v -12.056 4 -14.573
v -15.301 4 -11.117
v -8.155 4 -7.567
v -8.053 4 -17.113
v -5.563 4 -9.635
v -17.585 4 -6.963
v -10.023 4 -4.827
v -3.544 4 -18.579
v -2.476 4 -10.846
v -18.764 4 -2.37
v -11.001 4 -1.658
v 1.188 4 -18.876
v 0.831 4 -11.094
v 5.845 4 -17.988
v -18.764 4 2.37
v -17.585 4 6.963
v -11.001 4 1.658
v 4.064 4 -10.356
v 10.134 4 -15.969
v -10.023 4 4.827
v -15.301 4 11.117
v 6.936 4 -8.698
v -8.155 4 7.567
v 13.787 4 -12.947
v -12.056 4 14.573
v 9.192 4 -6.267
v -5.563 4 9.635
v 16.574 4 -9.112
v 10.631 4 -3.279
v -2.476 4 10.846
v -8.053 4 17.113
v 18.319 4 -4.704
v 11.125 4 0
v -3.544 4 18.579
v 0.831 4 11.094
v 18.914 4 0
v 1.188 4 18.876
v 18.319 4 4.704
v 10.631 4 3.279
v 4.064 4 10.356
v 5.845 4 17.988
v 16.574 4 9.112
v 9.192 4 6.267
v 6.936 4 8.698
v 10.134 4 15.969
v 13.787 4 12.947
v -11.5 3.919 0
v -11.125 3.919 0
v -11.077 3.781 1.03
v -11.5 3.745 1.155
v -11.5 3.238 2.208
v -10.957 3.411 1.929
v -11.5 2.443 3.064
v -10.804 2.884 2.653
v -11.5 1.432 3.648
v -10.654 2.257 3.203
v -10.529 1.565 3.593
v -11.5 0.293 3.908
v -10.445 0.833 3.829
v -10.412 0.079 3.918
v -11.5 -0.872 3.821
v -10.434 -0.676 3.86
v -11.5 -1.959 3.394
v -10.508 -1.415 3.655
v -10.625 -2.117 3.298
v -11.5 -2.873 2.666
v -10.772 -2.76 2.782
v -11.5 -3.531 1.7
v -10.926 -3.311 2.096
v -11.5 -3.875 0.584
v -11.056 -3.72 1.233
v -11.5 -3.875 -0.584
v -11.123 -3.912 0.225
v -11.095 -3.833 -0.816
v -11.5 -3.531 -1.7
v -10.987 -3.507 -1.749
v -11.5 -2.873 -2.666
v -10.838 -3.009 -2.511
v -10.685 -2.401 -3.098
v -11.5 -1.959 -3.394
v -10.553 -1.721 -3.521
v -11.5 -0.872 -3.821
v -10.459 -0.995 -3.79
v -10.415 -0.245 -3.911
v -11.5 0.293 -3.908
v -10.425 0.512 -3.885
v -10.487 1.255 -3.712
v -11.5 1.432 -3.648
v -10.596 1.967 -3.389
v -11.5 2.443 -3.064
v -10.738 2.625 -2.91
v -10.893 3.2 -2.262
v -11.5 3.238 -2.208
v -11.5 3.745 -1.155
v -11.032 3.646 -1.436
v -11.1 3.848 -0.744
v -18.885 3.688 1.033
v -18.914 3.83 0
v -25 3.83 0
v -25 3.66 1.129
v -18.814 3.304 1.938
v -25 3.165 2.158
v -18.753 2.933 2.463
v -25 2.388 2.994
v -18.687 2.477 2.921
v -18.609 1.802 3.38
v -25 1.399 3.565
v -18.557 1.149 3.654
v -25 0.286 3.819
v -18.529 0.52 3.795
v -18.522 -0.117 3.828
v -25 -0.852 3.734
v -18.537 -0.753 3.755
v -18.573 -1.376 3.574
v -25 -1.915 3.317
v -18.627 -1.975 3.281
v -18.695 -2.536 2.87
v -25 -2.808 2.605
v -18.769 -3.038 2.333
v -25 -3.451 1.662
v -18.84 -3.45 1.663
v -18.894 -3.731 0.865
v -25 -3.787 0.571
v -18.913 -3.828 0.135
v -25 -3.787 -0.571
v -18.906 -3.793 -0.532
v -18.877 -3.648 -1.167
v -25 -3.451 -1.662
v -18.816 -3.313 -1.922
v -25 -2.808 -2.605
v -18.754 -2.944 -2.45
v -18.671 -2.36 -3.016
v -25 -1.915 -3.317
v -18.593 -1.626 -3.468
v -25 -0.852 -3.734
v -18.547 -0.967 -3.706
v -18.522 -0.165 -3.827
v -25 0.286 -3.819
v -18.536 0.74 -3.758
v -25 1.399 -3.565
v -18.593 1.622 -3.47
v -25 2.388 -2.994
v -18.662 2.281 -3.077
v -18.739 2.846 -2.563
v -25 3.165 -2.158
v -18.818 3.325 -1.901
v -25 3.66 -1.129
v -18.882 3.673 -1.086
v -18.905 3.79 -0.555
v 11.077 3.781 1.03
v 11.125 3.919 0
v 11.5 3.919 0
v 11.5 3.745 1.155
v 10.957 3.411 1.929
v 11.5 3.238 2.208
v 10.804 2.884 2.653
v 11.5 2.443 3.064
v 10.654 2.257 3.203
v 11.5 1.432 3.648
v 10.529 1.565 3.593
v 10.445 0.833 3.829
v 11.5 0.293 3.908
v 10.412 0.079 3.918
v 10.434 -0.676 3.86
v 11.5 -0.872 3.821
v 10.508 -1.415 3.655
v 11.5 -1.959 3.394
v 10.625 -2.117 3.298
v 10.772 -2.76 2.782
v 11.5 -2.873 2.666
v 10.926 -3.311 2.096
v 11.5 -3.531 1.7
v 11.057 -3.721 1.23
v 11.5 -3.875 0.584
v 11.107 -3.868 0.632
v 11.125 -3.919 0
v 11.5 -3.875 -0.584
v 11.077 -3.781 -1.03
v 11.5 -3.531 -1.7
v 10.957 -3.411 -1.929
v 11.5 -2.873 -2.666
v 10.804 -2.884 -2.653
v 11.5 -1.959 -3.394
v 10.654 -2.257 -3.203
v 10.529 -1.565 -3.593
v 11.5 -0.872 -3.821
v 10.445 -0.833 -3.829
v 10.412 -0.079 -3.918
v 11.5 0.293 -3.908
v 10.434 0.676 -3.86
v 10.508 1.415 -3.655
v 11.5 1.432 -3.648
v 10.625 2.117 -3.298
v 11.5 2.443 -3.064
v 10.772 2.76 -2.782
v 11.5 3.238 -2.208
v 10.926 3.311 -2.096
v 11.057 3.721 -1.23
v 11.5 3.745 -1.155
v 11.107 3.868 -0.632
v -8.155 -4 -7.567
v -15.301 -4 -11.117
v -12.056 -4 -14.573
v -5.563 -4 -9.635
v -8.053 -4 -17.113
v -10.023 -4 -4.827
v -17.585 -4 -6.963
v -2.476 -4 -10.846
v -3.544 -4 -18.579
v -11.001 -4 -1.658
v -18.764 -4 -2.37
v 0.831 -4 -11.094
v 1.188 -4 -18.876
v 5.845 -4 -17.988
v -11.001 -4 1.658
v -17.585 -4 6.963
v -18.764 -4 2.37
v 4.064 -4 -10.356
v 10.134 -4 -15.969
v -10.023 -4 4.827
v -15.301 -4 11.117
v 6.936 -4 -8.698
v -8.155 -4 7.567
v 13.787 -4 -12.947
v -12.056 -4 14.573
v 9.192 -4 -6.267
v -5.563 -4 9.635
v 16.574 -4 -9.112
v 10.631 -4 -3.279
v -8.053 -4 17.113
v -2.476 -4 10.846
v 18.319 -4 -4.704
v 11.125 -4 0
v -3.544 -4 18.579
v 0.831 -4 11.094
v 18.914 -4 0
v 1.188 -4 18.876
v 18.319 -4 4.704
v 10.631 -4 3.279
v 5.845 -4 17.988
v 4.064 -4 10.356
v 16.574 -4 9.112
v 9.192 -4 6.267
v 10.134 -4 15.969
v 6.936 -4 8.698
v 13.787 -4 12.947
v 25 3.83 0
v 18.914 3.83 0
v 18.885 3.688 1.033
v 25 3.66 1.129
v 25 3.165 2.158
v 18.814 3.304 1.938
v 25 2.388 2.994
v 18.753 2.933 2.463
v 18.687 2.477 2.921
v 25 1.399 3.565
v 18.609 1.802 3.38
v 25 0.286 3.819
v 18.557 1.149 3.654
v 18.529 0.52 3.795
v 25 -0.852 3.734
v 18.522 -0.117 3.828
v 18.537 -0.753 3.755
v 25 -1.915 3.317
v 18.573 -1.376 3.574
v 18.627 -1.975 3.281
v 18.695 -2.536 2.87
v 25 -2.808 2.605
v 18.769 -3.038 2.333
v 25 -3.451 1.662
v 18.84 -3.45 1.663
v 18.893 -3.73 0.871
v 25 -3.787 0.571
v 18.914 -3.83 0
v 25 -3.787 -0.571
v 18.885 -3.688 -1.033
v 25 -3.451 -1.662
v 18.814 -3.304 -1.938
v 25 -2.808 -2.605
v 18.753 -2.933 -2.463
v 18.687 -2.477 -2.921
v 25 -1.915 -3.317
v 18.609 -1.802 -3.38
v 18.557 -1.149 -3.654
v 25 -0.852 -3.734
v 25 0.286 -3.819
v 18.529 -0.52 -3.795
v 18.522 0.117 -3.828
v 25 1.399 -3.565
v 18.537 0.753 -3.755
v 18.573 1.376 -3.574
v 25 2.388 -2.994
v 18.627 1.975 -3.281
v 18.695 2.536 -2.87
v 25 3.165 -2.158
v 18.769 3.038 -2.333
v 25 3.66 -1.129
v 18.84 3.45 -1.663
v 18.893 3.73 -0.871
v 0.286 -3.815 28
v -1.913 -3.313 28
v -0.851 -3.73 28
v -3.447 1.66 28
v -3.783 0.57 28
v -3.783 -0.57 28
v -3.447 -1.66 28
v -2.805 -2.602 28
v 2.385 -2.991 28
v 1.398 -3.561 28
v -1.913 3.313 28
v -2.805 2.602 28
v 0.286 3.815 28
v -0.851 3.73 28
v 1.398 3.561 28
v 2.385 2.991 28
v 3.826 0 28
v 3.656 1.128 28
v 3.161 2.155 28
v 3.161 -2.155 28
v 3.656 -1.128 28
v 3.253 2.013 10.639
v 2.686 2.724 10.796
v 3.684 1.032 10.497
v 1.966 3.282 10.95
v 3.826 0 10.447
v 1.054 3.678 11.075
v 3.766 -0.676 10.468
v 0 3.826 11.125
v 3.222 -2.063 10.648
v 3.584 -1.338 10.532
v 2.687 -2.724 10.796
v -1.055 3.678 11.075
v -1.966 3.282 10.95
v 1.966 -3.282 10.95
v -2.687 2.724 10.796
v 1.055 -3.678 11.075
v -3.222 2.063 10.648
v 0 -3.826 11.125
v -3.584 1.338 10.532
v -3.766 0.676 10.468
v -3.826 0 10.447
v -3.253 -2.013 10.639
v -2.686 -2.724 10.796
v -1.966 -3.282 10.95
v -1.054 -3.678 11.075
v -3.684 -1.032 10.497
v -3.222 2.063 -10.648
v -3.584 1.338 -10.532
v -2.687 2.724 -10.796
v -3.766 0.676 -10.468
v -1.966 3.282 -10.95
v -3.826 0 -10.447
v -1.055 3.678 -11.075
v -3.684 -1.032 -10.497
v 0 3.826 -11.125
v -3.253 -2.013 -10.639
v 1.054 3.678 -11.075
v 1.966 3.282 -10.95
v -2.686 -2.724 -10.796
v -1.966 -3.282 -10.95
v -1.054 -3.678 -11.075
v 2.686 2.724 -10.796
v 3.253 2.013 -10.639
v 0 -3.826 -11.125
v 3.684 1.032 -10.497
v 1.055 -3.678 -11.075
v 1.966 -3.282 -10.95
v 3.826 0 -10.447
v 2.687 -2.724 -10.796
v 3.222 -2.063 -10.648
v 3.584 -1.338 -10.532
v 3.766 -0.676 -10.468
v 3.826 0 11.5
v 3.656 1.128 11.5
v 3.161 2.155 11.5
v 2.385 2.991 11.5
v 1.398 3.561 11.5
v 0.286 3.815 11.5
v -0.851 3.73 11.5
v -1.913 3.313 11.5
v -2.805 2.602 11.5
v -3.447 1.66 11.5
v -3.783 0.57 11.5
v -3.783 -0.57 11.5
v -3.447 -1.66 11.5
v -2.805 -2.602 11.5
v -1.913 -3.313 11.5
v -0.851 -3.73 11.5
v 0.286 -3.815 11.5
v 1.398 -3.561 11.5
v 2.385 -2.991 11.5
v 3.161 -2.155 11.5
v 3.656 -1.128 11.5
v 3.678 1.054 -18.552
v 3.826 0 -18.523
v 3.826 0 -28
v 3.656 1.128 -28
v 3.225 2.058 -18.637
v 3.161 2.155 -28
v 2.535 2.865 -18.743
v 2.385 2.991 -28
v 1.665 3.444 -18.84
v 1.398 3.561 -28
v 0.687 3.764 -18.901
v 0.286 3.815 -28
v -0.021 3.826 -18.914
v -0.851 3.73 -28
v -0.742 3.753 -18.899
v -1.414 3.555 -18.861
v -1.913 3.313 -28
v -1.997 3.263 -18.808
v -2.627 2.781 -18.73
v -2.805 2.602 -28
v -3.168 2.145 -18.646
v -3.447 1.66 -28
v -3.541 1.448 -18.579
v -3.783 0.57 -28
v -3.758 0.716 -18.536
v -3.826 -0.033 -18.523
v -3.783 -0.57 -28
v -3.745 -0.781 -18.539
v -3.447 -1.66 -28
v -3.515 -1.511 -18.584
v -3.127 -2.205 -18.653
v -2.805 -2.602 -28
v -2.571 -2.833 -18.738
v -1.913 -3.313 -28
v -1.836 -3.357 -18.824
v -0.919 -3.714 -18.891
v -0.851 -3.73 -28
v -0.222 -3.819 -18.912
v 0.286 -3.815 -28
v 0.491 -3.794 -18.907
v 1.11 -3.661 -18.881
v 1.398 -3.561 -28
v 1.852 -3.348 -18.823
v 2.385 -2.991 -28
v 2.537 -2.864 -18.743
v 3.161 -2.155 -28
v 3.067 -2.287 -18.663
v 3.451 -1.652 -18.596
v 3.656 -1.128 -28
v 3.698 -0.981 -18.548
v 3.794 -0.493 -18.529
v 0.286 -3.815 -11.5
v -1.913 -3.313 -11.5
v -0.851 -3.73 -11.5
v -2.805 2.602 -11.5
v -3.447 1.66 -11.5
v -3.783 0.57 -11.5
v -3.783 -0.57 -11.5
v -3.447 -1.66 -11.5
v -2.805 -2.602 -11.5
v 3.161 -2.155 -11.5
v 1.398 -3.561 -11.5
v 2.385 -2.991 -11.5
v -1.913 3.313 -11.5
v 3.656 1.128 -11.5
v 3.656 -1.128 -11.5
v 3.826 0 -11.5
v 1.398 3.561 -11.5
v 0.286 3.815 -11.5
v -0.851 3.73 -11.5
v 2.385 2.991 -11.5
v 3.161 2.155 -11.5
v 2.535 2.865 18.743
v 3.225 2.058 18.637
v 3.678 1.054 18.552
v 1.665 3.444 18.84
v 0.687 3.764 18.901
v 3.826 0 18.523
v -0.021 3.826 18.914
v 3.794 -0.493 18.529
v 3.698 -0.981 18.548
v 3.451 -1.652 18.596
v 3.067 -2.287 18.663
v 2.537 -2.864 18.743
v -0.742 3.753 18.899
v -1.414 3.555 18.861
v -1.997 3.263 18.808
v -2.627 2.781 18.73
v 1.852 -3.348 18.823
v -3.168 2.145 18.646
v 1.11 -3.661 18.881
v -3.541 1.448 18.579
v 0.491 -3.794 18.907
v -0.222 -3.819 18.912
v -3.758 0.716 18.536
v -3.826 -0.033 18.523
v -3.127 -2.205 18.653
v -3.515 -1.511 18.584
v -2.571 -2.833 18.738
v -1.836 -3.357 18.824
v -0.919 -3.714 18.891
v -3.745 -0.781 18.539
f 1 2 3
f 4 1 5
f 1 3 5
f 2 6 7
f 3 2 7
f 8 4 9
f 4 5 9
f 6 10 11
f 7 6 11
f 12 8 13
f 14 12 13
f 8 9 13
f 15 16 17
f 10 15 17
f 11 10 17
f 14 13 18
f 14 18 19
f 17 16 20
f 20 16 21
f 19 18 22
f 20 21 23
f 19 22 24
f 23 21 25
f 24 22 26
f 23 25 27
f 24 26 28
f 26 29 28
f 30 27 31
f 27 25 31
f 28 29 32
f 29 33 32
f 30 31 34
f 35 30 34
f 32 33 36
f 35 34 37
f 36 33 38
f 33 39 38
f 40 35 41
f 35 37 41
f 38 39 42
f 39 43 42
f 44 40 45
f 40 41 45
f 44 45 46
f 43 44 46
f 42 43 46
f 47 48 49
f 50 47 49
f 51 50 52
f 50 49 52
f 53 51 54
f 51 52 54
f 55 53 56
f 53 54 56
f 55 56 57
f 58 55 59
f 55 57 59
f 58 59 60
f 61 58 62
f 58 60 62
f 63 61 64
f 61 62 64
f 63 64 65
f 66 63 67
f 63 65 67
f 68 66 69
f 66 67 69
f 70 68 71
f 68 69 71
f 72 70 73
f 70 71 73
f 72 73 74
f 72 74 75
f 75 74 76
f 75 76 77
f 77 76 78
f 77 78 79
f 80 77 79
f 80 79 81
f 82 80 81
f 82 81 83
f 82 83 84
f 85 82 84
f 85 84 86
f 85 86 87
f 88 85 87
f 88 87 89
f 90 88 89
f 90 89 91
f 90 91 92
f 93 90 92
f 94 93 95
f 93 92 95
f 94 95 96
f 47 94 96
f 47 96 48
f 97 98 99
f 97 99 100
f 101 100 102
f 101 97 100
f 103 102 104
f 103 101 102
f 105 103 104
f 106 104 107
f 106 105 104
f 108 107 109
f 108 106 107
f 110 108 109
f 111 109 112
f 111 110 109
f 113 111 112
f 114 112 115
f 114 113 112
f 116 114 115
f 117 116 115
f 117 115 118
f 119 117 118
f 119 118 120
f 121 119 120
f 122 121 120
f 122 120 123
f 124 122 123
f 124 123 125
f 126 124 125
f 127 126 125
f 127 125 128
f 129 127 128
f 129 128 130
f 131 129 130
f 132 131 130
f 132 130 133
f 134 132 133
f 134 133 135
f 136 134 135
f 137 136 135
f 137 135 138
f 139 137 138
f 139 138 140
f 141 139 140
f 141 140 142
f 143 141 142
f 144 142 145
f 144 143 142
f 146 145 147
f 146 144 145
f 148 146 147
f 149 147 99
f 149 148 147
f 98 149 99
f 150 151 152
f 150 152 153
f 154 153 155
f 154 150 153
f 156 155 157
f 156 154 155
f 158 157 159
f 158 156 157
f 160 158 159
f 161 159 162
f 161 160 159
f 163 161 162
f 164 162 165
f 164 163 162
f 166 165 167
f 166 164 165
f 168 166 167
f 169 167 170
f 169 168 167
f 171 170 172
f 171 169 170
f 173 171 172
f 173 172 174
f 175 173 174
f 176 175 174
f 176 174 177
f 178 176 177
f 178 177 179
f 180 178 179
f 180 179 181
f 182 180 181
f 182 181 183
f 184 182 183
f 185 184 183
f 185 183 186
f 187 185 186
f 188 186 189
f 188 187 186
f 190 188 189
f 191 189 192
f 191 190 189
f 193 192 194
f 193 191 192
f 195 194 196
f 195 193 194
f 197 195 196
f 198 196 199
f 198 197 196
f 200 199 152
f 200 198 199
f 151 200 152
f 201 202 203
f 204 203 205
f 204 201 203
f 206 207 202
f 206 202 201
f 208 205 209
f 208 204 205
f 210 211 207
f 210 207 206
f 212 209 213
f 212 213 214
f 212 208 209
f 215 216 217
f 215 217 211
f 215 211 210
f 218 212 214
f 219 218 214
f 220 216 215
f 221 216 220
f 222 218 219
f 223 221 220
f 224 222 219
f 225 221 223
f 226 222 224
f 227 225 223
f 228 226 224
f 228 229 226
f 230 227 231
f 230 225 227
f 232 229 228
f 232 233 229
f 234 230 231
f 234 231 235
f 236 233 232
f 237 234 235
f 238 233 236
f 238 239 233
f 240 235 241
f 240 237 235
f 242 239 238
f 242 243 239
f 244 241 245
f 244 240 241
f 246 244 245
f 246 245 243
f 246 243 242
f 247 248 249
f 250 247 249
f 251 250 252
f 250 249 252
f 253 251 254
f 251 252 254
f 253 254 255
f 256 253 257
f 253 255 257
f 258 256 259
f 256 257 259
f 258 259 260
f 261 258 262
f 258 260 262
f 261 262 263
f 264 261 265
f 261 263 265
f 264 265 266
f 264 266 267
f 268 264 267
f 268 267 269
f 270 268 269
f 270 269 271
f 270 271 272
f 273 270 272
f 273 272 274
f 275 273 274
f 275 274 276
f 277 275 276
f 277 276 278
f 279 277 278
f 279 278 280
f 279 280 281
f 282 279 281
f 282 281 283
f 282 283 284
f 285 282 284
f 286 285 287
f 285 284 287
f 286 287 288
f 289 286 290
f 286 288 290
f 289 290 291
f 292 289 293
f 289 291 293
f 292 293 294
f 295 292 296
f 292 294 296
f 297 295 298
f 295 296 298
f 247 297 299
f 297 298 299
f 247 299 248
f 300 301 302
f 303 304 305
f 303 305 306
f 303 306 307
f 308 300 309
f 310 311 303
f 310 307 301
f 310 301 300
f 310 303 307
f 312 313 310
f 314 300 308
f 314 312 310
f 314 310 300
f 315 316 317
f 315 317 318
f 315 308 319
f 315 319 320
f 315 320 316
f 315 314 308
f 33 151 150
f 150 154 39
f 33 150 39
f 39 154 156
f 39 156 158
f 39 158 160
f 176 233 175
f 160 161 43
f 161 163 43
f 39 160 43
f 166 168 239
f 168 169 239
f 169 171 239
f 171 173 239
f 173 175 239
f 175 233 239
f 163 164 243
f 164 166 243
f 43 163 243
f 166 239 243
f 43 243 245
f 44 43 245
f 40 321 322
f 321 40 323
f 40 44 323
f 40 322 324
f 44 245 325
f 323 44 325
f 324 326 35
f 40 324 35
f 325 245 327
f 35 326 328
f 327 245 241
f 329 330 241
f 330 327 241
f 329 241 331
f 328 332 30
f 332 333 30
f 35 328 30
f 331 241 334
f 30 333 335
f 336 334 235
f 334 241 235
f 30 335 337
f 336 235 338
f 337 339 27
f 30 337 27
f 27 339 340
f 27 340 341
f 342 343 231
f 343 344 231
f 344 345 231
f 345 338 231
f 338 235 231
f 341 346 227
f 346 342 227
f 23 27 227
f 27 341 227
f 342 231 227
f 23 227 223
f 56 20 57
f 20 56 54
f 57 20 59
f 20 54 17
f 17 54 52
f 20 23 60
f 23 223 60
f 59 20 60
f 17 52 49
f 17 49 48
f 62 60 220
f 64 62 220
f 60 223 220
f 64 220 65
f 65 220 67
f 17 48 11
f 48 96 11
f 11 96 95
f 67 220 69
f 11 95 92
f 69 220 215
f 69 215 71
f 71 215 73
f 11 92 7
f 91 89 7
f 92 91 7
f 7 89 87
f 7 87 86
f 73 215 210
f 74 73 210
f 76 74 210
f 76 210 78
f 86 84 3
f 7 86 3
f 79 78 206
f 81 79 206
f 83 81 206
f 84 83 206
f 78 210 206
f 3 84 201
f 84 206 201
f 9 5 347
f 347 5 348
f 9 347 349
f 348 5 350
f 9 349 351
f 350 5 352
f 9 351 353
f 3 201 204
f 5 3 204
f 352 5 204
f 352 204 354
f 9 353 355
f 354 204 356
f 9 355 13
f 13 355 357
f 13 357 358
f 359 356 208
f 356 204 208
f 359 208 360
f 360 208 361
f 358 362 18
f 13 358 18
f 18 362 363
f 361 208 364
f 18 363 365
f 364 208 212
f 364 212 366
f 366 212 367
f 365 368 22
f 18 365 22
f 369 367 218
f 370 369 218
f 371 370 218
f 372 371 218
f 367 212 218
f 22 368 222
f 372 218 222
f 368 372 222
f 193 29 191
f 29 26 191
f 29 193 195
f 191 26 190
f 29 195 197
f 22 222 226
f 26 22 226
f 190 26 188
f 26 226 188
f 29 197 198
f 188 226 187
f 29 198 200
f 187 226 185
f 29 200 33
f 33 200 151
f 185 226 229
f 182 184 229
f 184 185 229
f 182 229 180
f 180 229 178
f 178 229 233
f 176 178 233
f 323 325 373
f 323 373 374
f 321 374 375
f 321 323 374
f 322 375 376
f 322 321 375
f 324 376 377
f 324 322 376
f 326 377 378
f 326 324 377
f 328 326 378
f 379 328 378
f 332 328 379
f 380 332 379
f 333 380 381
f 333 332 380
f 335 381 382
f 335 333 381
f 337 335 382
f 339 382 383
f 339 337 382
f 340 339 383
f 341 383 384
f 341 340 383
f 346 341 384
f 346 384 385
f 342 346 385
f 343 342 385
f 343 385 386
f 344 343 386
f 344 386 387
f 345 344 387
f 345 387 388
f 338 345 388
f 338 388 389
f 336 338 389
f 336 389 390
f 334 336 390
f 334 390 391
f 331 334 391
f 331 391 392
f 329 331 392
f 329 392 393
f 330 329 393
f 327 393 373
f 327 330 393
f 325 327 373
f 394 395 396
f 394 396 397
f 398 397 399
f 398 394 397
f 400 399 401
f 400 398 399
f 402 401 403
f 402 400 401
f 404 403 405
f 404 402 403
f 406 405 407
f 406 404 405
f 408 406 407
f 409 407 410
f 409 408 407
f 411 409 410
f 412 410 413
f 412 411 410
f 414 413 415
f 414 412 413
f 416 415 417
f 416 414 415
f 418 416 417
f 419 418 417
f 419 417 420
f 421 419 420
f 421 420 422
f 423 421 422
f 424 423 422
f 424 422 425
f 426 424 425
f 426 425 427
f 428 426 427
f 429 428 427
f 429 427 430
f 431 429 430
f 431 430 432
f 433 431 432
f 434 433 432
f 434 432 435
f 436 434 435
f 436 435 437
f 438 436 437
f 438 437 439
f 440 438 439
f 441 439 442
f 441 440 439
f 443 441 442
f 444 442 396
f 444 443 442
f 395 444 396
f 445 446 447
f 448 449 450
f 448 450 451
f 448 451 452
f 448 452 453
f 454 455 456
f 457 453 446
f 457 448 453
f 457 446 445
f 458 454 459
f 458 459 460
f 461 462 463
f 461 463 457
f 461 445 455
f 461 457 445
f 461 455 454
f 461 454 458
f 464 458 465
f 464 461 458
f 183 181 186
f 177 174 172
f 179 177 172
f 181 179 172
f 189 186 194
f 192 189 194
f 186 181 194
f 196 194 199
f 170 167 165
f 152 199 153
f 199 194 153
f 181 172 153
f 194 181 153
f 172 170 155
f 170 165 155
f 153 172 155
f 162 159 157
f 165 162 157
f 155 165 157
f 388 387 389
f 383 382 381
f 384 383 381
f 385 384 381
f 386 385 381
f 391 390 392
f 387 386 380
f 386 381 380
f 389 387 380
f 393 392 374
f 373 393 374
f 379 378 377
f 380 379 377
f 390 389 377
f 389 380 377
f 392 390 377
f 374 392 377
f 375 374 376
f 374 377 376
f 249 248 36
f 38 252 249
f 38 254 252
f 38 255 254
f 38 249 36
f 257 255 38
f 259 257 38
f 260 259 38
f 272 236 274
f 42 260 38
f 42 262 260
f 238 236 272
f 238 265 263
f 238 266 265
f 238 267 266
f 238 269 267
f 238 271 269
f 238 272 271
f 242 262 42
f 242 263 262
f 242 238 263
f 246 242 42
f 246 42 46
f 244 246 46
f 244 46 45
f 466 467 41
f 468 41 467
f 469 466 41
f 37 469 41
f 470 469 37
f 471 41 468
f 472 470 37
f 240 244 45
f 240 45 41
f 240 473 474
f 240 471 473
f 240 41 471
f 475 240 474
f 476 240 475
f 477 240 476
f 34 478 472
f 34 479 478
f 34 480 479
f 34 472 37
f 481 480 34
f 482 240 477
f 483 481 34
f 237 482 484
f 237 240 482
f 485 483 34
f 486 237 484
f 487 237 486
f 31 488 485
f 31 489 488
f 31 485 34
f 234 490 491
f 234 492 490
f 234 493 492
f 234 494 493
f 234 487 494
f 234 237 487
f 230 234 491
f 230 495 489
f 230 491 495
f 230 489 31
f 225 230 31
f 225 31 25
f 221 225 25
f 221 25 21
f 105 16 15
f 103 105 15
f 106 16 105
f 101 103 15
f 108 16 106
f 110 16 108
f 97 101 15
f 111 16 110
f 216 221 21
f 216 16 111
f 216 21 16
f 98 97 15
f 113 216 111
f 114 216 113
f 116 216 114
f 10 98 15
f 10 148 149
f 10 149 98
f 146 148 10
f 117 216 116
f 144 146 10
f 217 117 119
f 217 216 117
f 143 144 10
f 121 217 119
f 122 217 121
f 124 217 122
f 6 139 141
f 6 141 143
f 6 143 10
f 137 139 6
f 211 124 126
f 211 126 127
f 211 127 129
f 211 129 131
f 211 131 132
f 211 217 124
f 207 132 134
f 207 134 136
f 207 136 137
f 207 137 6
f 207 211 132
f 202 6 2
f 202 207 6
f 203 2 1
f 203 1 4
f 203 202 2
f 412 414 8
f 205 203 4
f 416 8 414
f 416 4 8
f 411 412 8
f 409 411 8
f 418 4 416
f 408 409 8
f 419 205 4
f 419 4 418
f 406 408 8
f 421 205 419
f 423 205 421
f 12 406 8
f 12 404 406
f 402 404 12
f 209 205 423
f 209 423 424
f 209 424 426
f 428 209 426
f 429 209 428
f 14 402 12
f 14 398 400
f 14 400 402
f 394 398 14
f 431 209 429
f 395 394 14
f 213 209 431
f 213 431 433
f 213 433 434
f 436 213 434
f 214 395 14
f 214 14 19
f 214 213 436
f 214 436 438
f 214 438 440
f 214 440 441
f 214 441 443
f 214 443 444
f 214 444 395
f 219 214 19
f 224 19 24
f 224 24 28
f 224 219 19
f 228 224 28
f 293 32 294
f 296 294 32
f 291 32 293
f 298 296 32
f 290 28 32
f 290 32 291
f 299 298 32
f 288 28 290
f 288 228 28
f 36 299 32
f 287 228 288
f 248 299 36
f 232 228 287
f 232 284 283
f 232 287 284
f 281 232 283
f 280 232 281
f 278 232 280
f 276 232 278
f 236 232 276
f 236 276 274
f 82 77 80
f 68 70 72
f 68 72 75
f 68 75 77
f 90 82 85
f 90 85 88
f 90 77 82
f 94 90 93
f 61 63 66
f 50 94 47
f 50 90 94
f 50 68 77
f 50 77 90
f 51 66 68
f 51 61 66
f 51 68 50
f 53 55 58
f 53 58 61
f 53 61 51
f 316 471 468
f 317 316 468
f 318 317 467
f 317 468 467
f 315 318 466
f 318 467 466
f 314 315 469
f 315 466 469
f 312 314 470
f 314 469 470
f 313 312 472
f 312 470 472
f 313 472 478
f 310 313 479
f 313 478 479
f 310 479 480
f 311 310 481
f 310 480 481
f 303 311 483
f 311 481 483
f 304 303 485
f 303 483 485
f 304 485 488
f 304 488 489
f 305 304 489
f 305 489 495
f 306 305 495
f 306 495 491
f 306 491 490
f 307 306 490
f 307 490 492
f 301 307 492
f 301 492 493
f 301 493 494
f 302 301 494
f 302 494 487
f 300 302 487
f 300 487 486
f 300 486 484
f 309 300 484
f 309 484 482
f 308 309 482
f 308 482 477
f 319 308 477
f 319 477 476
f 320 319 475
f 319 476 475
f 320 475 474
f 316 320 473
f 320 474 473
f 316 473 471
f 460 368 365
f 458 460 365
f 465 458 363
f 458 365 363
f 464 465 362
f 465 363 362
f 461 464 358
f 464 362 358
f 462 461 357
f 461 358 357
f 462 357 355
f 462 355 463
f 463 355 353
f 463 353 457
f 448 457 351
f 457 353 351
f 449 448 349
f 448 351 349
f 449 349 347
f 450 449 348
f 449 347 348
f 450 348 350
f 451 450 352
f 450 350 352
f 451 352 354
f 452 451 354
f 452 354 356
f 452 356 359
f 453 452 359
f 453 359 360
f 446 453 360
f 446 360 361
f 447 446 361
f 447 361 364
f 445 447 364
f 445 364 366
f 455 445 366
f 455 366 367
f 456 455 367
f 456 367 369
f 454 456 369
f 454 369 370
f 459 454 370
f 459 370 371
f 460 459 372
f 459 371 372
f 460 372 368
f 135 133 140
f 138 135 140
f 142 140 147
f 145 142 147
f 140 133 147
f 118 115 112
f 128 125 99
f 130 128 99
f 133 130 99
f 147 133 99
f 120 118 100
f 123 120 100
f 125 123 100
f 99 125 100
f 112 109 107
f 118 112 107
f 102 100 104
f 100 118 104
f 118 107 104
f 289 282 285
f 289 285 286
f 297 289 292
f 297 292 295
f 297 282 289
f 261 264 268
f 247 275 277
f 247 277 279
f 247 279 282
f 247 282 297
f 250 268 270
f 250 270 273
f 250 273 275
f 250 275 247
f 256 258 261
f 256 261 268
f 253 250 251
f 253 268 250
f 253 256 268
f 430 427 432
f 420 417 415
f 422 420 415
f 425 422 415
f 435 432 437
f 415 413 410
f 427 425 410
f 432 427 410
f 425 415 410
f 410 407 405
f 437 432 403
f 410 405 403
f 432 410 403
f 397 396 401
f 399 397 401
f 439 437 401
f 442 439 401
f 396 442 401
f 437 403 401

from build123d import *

# Parameters (mm, degrees)
F0_R          = 18.9135358378
F0_R_2        = 11.1250506431
F1_DEPTH      = 4
F1_DEPTH_BACK = 4
F2_R          = 3.8258628395
F3_DEPTH      = 28
F3_DEPTH_BACK = 28
F4_R          = 3.8258764398
F5_DEPTH      = 11.5
F5_DEPTH_BACK = 11.5
F6_R          = 3.830099353
F7_DEPTH      = 25
F7_DEPTH_BACK = 25
F8_R          = 3.9189417201
F9_DEPTH      = 11.5
F9_DEPTH_BACK = 11.5


with BuildPart() as f1:
    # F0 (on Front) → F1 (new body, two sides)
    with BuildSketch(Plane.XZ) as f1_sk:
        Circle(F0_R)
        Circle(F0_R_2, mode=Mode.SUBTRACT)
    extrude(amount=F1_DEPTH)
    extrude(f1_sk.sketch, amount=-F1_DEPTH_BACK)

    # F2 (on Top) → F3 (join, two sides)
    with BuildSketch(Plane.XY) as f3_sk:
        Circle(F2_R)
    extrude(amount=F3_DEPTH)
    extrude(f3_sk.sketch, amount=-F3_DEPTH_BACK)

    # F4 (on Top) → F5 (cut, two sides)
    with BuildSketch(Plane.XY) as f5_sk:
        Circle(F4_R)
    extrude(amount=-F5_DEPTH, mode=Mode.SUBTRACT)
    extrude(f5_sk.sketch, amount=F5_DEPTH_BACK, mode=Mode.SUBTRACT)

    # F6 (on Right) → F7 (join, two sides)
    with BuildSketch(Plane.YZ) as f7_sk:
        Circle(F6_R)
    extrude(amount=F7_DEPTH)
    extrude(f7_sk.sketch, amount=-F7_DEPTH_BACK)

    # F8 (on Right) → F9 (cut, two sides)
    with BuildSketch(Plane.YZ) as f9_sk:
        Circle(F8_R)
    extrude(amount=-F9_DEPTH, mode=Mode.SUBTRACT)
    extrude(f9_sk.sketch, amount=F9_DEPTH_BACK, mode=Mode.SUBTRACT)


solid = f1.part
